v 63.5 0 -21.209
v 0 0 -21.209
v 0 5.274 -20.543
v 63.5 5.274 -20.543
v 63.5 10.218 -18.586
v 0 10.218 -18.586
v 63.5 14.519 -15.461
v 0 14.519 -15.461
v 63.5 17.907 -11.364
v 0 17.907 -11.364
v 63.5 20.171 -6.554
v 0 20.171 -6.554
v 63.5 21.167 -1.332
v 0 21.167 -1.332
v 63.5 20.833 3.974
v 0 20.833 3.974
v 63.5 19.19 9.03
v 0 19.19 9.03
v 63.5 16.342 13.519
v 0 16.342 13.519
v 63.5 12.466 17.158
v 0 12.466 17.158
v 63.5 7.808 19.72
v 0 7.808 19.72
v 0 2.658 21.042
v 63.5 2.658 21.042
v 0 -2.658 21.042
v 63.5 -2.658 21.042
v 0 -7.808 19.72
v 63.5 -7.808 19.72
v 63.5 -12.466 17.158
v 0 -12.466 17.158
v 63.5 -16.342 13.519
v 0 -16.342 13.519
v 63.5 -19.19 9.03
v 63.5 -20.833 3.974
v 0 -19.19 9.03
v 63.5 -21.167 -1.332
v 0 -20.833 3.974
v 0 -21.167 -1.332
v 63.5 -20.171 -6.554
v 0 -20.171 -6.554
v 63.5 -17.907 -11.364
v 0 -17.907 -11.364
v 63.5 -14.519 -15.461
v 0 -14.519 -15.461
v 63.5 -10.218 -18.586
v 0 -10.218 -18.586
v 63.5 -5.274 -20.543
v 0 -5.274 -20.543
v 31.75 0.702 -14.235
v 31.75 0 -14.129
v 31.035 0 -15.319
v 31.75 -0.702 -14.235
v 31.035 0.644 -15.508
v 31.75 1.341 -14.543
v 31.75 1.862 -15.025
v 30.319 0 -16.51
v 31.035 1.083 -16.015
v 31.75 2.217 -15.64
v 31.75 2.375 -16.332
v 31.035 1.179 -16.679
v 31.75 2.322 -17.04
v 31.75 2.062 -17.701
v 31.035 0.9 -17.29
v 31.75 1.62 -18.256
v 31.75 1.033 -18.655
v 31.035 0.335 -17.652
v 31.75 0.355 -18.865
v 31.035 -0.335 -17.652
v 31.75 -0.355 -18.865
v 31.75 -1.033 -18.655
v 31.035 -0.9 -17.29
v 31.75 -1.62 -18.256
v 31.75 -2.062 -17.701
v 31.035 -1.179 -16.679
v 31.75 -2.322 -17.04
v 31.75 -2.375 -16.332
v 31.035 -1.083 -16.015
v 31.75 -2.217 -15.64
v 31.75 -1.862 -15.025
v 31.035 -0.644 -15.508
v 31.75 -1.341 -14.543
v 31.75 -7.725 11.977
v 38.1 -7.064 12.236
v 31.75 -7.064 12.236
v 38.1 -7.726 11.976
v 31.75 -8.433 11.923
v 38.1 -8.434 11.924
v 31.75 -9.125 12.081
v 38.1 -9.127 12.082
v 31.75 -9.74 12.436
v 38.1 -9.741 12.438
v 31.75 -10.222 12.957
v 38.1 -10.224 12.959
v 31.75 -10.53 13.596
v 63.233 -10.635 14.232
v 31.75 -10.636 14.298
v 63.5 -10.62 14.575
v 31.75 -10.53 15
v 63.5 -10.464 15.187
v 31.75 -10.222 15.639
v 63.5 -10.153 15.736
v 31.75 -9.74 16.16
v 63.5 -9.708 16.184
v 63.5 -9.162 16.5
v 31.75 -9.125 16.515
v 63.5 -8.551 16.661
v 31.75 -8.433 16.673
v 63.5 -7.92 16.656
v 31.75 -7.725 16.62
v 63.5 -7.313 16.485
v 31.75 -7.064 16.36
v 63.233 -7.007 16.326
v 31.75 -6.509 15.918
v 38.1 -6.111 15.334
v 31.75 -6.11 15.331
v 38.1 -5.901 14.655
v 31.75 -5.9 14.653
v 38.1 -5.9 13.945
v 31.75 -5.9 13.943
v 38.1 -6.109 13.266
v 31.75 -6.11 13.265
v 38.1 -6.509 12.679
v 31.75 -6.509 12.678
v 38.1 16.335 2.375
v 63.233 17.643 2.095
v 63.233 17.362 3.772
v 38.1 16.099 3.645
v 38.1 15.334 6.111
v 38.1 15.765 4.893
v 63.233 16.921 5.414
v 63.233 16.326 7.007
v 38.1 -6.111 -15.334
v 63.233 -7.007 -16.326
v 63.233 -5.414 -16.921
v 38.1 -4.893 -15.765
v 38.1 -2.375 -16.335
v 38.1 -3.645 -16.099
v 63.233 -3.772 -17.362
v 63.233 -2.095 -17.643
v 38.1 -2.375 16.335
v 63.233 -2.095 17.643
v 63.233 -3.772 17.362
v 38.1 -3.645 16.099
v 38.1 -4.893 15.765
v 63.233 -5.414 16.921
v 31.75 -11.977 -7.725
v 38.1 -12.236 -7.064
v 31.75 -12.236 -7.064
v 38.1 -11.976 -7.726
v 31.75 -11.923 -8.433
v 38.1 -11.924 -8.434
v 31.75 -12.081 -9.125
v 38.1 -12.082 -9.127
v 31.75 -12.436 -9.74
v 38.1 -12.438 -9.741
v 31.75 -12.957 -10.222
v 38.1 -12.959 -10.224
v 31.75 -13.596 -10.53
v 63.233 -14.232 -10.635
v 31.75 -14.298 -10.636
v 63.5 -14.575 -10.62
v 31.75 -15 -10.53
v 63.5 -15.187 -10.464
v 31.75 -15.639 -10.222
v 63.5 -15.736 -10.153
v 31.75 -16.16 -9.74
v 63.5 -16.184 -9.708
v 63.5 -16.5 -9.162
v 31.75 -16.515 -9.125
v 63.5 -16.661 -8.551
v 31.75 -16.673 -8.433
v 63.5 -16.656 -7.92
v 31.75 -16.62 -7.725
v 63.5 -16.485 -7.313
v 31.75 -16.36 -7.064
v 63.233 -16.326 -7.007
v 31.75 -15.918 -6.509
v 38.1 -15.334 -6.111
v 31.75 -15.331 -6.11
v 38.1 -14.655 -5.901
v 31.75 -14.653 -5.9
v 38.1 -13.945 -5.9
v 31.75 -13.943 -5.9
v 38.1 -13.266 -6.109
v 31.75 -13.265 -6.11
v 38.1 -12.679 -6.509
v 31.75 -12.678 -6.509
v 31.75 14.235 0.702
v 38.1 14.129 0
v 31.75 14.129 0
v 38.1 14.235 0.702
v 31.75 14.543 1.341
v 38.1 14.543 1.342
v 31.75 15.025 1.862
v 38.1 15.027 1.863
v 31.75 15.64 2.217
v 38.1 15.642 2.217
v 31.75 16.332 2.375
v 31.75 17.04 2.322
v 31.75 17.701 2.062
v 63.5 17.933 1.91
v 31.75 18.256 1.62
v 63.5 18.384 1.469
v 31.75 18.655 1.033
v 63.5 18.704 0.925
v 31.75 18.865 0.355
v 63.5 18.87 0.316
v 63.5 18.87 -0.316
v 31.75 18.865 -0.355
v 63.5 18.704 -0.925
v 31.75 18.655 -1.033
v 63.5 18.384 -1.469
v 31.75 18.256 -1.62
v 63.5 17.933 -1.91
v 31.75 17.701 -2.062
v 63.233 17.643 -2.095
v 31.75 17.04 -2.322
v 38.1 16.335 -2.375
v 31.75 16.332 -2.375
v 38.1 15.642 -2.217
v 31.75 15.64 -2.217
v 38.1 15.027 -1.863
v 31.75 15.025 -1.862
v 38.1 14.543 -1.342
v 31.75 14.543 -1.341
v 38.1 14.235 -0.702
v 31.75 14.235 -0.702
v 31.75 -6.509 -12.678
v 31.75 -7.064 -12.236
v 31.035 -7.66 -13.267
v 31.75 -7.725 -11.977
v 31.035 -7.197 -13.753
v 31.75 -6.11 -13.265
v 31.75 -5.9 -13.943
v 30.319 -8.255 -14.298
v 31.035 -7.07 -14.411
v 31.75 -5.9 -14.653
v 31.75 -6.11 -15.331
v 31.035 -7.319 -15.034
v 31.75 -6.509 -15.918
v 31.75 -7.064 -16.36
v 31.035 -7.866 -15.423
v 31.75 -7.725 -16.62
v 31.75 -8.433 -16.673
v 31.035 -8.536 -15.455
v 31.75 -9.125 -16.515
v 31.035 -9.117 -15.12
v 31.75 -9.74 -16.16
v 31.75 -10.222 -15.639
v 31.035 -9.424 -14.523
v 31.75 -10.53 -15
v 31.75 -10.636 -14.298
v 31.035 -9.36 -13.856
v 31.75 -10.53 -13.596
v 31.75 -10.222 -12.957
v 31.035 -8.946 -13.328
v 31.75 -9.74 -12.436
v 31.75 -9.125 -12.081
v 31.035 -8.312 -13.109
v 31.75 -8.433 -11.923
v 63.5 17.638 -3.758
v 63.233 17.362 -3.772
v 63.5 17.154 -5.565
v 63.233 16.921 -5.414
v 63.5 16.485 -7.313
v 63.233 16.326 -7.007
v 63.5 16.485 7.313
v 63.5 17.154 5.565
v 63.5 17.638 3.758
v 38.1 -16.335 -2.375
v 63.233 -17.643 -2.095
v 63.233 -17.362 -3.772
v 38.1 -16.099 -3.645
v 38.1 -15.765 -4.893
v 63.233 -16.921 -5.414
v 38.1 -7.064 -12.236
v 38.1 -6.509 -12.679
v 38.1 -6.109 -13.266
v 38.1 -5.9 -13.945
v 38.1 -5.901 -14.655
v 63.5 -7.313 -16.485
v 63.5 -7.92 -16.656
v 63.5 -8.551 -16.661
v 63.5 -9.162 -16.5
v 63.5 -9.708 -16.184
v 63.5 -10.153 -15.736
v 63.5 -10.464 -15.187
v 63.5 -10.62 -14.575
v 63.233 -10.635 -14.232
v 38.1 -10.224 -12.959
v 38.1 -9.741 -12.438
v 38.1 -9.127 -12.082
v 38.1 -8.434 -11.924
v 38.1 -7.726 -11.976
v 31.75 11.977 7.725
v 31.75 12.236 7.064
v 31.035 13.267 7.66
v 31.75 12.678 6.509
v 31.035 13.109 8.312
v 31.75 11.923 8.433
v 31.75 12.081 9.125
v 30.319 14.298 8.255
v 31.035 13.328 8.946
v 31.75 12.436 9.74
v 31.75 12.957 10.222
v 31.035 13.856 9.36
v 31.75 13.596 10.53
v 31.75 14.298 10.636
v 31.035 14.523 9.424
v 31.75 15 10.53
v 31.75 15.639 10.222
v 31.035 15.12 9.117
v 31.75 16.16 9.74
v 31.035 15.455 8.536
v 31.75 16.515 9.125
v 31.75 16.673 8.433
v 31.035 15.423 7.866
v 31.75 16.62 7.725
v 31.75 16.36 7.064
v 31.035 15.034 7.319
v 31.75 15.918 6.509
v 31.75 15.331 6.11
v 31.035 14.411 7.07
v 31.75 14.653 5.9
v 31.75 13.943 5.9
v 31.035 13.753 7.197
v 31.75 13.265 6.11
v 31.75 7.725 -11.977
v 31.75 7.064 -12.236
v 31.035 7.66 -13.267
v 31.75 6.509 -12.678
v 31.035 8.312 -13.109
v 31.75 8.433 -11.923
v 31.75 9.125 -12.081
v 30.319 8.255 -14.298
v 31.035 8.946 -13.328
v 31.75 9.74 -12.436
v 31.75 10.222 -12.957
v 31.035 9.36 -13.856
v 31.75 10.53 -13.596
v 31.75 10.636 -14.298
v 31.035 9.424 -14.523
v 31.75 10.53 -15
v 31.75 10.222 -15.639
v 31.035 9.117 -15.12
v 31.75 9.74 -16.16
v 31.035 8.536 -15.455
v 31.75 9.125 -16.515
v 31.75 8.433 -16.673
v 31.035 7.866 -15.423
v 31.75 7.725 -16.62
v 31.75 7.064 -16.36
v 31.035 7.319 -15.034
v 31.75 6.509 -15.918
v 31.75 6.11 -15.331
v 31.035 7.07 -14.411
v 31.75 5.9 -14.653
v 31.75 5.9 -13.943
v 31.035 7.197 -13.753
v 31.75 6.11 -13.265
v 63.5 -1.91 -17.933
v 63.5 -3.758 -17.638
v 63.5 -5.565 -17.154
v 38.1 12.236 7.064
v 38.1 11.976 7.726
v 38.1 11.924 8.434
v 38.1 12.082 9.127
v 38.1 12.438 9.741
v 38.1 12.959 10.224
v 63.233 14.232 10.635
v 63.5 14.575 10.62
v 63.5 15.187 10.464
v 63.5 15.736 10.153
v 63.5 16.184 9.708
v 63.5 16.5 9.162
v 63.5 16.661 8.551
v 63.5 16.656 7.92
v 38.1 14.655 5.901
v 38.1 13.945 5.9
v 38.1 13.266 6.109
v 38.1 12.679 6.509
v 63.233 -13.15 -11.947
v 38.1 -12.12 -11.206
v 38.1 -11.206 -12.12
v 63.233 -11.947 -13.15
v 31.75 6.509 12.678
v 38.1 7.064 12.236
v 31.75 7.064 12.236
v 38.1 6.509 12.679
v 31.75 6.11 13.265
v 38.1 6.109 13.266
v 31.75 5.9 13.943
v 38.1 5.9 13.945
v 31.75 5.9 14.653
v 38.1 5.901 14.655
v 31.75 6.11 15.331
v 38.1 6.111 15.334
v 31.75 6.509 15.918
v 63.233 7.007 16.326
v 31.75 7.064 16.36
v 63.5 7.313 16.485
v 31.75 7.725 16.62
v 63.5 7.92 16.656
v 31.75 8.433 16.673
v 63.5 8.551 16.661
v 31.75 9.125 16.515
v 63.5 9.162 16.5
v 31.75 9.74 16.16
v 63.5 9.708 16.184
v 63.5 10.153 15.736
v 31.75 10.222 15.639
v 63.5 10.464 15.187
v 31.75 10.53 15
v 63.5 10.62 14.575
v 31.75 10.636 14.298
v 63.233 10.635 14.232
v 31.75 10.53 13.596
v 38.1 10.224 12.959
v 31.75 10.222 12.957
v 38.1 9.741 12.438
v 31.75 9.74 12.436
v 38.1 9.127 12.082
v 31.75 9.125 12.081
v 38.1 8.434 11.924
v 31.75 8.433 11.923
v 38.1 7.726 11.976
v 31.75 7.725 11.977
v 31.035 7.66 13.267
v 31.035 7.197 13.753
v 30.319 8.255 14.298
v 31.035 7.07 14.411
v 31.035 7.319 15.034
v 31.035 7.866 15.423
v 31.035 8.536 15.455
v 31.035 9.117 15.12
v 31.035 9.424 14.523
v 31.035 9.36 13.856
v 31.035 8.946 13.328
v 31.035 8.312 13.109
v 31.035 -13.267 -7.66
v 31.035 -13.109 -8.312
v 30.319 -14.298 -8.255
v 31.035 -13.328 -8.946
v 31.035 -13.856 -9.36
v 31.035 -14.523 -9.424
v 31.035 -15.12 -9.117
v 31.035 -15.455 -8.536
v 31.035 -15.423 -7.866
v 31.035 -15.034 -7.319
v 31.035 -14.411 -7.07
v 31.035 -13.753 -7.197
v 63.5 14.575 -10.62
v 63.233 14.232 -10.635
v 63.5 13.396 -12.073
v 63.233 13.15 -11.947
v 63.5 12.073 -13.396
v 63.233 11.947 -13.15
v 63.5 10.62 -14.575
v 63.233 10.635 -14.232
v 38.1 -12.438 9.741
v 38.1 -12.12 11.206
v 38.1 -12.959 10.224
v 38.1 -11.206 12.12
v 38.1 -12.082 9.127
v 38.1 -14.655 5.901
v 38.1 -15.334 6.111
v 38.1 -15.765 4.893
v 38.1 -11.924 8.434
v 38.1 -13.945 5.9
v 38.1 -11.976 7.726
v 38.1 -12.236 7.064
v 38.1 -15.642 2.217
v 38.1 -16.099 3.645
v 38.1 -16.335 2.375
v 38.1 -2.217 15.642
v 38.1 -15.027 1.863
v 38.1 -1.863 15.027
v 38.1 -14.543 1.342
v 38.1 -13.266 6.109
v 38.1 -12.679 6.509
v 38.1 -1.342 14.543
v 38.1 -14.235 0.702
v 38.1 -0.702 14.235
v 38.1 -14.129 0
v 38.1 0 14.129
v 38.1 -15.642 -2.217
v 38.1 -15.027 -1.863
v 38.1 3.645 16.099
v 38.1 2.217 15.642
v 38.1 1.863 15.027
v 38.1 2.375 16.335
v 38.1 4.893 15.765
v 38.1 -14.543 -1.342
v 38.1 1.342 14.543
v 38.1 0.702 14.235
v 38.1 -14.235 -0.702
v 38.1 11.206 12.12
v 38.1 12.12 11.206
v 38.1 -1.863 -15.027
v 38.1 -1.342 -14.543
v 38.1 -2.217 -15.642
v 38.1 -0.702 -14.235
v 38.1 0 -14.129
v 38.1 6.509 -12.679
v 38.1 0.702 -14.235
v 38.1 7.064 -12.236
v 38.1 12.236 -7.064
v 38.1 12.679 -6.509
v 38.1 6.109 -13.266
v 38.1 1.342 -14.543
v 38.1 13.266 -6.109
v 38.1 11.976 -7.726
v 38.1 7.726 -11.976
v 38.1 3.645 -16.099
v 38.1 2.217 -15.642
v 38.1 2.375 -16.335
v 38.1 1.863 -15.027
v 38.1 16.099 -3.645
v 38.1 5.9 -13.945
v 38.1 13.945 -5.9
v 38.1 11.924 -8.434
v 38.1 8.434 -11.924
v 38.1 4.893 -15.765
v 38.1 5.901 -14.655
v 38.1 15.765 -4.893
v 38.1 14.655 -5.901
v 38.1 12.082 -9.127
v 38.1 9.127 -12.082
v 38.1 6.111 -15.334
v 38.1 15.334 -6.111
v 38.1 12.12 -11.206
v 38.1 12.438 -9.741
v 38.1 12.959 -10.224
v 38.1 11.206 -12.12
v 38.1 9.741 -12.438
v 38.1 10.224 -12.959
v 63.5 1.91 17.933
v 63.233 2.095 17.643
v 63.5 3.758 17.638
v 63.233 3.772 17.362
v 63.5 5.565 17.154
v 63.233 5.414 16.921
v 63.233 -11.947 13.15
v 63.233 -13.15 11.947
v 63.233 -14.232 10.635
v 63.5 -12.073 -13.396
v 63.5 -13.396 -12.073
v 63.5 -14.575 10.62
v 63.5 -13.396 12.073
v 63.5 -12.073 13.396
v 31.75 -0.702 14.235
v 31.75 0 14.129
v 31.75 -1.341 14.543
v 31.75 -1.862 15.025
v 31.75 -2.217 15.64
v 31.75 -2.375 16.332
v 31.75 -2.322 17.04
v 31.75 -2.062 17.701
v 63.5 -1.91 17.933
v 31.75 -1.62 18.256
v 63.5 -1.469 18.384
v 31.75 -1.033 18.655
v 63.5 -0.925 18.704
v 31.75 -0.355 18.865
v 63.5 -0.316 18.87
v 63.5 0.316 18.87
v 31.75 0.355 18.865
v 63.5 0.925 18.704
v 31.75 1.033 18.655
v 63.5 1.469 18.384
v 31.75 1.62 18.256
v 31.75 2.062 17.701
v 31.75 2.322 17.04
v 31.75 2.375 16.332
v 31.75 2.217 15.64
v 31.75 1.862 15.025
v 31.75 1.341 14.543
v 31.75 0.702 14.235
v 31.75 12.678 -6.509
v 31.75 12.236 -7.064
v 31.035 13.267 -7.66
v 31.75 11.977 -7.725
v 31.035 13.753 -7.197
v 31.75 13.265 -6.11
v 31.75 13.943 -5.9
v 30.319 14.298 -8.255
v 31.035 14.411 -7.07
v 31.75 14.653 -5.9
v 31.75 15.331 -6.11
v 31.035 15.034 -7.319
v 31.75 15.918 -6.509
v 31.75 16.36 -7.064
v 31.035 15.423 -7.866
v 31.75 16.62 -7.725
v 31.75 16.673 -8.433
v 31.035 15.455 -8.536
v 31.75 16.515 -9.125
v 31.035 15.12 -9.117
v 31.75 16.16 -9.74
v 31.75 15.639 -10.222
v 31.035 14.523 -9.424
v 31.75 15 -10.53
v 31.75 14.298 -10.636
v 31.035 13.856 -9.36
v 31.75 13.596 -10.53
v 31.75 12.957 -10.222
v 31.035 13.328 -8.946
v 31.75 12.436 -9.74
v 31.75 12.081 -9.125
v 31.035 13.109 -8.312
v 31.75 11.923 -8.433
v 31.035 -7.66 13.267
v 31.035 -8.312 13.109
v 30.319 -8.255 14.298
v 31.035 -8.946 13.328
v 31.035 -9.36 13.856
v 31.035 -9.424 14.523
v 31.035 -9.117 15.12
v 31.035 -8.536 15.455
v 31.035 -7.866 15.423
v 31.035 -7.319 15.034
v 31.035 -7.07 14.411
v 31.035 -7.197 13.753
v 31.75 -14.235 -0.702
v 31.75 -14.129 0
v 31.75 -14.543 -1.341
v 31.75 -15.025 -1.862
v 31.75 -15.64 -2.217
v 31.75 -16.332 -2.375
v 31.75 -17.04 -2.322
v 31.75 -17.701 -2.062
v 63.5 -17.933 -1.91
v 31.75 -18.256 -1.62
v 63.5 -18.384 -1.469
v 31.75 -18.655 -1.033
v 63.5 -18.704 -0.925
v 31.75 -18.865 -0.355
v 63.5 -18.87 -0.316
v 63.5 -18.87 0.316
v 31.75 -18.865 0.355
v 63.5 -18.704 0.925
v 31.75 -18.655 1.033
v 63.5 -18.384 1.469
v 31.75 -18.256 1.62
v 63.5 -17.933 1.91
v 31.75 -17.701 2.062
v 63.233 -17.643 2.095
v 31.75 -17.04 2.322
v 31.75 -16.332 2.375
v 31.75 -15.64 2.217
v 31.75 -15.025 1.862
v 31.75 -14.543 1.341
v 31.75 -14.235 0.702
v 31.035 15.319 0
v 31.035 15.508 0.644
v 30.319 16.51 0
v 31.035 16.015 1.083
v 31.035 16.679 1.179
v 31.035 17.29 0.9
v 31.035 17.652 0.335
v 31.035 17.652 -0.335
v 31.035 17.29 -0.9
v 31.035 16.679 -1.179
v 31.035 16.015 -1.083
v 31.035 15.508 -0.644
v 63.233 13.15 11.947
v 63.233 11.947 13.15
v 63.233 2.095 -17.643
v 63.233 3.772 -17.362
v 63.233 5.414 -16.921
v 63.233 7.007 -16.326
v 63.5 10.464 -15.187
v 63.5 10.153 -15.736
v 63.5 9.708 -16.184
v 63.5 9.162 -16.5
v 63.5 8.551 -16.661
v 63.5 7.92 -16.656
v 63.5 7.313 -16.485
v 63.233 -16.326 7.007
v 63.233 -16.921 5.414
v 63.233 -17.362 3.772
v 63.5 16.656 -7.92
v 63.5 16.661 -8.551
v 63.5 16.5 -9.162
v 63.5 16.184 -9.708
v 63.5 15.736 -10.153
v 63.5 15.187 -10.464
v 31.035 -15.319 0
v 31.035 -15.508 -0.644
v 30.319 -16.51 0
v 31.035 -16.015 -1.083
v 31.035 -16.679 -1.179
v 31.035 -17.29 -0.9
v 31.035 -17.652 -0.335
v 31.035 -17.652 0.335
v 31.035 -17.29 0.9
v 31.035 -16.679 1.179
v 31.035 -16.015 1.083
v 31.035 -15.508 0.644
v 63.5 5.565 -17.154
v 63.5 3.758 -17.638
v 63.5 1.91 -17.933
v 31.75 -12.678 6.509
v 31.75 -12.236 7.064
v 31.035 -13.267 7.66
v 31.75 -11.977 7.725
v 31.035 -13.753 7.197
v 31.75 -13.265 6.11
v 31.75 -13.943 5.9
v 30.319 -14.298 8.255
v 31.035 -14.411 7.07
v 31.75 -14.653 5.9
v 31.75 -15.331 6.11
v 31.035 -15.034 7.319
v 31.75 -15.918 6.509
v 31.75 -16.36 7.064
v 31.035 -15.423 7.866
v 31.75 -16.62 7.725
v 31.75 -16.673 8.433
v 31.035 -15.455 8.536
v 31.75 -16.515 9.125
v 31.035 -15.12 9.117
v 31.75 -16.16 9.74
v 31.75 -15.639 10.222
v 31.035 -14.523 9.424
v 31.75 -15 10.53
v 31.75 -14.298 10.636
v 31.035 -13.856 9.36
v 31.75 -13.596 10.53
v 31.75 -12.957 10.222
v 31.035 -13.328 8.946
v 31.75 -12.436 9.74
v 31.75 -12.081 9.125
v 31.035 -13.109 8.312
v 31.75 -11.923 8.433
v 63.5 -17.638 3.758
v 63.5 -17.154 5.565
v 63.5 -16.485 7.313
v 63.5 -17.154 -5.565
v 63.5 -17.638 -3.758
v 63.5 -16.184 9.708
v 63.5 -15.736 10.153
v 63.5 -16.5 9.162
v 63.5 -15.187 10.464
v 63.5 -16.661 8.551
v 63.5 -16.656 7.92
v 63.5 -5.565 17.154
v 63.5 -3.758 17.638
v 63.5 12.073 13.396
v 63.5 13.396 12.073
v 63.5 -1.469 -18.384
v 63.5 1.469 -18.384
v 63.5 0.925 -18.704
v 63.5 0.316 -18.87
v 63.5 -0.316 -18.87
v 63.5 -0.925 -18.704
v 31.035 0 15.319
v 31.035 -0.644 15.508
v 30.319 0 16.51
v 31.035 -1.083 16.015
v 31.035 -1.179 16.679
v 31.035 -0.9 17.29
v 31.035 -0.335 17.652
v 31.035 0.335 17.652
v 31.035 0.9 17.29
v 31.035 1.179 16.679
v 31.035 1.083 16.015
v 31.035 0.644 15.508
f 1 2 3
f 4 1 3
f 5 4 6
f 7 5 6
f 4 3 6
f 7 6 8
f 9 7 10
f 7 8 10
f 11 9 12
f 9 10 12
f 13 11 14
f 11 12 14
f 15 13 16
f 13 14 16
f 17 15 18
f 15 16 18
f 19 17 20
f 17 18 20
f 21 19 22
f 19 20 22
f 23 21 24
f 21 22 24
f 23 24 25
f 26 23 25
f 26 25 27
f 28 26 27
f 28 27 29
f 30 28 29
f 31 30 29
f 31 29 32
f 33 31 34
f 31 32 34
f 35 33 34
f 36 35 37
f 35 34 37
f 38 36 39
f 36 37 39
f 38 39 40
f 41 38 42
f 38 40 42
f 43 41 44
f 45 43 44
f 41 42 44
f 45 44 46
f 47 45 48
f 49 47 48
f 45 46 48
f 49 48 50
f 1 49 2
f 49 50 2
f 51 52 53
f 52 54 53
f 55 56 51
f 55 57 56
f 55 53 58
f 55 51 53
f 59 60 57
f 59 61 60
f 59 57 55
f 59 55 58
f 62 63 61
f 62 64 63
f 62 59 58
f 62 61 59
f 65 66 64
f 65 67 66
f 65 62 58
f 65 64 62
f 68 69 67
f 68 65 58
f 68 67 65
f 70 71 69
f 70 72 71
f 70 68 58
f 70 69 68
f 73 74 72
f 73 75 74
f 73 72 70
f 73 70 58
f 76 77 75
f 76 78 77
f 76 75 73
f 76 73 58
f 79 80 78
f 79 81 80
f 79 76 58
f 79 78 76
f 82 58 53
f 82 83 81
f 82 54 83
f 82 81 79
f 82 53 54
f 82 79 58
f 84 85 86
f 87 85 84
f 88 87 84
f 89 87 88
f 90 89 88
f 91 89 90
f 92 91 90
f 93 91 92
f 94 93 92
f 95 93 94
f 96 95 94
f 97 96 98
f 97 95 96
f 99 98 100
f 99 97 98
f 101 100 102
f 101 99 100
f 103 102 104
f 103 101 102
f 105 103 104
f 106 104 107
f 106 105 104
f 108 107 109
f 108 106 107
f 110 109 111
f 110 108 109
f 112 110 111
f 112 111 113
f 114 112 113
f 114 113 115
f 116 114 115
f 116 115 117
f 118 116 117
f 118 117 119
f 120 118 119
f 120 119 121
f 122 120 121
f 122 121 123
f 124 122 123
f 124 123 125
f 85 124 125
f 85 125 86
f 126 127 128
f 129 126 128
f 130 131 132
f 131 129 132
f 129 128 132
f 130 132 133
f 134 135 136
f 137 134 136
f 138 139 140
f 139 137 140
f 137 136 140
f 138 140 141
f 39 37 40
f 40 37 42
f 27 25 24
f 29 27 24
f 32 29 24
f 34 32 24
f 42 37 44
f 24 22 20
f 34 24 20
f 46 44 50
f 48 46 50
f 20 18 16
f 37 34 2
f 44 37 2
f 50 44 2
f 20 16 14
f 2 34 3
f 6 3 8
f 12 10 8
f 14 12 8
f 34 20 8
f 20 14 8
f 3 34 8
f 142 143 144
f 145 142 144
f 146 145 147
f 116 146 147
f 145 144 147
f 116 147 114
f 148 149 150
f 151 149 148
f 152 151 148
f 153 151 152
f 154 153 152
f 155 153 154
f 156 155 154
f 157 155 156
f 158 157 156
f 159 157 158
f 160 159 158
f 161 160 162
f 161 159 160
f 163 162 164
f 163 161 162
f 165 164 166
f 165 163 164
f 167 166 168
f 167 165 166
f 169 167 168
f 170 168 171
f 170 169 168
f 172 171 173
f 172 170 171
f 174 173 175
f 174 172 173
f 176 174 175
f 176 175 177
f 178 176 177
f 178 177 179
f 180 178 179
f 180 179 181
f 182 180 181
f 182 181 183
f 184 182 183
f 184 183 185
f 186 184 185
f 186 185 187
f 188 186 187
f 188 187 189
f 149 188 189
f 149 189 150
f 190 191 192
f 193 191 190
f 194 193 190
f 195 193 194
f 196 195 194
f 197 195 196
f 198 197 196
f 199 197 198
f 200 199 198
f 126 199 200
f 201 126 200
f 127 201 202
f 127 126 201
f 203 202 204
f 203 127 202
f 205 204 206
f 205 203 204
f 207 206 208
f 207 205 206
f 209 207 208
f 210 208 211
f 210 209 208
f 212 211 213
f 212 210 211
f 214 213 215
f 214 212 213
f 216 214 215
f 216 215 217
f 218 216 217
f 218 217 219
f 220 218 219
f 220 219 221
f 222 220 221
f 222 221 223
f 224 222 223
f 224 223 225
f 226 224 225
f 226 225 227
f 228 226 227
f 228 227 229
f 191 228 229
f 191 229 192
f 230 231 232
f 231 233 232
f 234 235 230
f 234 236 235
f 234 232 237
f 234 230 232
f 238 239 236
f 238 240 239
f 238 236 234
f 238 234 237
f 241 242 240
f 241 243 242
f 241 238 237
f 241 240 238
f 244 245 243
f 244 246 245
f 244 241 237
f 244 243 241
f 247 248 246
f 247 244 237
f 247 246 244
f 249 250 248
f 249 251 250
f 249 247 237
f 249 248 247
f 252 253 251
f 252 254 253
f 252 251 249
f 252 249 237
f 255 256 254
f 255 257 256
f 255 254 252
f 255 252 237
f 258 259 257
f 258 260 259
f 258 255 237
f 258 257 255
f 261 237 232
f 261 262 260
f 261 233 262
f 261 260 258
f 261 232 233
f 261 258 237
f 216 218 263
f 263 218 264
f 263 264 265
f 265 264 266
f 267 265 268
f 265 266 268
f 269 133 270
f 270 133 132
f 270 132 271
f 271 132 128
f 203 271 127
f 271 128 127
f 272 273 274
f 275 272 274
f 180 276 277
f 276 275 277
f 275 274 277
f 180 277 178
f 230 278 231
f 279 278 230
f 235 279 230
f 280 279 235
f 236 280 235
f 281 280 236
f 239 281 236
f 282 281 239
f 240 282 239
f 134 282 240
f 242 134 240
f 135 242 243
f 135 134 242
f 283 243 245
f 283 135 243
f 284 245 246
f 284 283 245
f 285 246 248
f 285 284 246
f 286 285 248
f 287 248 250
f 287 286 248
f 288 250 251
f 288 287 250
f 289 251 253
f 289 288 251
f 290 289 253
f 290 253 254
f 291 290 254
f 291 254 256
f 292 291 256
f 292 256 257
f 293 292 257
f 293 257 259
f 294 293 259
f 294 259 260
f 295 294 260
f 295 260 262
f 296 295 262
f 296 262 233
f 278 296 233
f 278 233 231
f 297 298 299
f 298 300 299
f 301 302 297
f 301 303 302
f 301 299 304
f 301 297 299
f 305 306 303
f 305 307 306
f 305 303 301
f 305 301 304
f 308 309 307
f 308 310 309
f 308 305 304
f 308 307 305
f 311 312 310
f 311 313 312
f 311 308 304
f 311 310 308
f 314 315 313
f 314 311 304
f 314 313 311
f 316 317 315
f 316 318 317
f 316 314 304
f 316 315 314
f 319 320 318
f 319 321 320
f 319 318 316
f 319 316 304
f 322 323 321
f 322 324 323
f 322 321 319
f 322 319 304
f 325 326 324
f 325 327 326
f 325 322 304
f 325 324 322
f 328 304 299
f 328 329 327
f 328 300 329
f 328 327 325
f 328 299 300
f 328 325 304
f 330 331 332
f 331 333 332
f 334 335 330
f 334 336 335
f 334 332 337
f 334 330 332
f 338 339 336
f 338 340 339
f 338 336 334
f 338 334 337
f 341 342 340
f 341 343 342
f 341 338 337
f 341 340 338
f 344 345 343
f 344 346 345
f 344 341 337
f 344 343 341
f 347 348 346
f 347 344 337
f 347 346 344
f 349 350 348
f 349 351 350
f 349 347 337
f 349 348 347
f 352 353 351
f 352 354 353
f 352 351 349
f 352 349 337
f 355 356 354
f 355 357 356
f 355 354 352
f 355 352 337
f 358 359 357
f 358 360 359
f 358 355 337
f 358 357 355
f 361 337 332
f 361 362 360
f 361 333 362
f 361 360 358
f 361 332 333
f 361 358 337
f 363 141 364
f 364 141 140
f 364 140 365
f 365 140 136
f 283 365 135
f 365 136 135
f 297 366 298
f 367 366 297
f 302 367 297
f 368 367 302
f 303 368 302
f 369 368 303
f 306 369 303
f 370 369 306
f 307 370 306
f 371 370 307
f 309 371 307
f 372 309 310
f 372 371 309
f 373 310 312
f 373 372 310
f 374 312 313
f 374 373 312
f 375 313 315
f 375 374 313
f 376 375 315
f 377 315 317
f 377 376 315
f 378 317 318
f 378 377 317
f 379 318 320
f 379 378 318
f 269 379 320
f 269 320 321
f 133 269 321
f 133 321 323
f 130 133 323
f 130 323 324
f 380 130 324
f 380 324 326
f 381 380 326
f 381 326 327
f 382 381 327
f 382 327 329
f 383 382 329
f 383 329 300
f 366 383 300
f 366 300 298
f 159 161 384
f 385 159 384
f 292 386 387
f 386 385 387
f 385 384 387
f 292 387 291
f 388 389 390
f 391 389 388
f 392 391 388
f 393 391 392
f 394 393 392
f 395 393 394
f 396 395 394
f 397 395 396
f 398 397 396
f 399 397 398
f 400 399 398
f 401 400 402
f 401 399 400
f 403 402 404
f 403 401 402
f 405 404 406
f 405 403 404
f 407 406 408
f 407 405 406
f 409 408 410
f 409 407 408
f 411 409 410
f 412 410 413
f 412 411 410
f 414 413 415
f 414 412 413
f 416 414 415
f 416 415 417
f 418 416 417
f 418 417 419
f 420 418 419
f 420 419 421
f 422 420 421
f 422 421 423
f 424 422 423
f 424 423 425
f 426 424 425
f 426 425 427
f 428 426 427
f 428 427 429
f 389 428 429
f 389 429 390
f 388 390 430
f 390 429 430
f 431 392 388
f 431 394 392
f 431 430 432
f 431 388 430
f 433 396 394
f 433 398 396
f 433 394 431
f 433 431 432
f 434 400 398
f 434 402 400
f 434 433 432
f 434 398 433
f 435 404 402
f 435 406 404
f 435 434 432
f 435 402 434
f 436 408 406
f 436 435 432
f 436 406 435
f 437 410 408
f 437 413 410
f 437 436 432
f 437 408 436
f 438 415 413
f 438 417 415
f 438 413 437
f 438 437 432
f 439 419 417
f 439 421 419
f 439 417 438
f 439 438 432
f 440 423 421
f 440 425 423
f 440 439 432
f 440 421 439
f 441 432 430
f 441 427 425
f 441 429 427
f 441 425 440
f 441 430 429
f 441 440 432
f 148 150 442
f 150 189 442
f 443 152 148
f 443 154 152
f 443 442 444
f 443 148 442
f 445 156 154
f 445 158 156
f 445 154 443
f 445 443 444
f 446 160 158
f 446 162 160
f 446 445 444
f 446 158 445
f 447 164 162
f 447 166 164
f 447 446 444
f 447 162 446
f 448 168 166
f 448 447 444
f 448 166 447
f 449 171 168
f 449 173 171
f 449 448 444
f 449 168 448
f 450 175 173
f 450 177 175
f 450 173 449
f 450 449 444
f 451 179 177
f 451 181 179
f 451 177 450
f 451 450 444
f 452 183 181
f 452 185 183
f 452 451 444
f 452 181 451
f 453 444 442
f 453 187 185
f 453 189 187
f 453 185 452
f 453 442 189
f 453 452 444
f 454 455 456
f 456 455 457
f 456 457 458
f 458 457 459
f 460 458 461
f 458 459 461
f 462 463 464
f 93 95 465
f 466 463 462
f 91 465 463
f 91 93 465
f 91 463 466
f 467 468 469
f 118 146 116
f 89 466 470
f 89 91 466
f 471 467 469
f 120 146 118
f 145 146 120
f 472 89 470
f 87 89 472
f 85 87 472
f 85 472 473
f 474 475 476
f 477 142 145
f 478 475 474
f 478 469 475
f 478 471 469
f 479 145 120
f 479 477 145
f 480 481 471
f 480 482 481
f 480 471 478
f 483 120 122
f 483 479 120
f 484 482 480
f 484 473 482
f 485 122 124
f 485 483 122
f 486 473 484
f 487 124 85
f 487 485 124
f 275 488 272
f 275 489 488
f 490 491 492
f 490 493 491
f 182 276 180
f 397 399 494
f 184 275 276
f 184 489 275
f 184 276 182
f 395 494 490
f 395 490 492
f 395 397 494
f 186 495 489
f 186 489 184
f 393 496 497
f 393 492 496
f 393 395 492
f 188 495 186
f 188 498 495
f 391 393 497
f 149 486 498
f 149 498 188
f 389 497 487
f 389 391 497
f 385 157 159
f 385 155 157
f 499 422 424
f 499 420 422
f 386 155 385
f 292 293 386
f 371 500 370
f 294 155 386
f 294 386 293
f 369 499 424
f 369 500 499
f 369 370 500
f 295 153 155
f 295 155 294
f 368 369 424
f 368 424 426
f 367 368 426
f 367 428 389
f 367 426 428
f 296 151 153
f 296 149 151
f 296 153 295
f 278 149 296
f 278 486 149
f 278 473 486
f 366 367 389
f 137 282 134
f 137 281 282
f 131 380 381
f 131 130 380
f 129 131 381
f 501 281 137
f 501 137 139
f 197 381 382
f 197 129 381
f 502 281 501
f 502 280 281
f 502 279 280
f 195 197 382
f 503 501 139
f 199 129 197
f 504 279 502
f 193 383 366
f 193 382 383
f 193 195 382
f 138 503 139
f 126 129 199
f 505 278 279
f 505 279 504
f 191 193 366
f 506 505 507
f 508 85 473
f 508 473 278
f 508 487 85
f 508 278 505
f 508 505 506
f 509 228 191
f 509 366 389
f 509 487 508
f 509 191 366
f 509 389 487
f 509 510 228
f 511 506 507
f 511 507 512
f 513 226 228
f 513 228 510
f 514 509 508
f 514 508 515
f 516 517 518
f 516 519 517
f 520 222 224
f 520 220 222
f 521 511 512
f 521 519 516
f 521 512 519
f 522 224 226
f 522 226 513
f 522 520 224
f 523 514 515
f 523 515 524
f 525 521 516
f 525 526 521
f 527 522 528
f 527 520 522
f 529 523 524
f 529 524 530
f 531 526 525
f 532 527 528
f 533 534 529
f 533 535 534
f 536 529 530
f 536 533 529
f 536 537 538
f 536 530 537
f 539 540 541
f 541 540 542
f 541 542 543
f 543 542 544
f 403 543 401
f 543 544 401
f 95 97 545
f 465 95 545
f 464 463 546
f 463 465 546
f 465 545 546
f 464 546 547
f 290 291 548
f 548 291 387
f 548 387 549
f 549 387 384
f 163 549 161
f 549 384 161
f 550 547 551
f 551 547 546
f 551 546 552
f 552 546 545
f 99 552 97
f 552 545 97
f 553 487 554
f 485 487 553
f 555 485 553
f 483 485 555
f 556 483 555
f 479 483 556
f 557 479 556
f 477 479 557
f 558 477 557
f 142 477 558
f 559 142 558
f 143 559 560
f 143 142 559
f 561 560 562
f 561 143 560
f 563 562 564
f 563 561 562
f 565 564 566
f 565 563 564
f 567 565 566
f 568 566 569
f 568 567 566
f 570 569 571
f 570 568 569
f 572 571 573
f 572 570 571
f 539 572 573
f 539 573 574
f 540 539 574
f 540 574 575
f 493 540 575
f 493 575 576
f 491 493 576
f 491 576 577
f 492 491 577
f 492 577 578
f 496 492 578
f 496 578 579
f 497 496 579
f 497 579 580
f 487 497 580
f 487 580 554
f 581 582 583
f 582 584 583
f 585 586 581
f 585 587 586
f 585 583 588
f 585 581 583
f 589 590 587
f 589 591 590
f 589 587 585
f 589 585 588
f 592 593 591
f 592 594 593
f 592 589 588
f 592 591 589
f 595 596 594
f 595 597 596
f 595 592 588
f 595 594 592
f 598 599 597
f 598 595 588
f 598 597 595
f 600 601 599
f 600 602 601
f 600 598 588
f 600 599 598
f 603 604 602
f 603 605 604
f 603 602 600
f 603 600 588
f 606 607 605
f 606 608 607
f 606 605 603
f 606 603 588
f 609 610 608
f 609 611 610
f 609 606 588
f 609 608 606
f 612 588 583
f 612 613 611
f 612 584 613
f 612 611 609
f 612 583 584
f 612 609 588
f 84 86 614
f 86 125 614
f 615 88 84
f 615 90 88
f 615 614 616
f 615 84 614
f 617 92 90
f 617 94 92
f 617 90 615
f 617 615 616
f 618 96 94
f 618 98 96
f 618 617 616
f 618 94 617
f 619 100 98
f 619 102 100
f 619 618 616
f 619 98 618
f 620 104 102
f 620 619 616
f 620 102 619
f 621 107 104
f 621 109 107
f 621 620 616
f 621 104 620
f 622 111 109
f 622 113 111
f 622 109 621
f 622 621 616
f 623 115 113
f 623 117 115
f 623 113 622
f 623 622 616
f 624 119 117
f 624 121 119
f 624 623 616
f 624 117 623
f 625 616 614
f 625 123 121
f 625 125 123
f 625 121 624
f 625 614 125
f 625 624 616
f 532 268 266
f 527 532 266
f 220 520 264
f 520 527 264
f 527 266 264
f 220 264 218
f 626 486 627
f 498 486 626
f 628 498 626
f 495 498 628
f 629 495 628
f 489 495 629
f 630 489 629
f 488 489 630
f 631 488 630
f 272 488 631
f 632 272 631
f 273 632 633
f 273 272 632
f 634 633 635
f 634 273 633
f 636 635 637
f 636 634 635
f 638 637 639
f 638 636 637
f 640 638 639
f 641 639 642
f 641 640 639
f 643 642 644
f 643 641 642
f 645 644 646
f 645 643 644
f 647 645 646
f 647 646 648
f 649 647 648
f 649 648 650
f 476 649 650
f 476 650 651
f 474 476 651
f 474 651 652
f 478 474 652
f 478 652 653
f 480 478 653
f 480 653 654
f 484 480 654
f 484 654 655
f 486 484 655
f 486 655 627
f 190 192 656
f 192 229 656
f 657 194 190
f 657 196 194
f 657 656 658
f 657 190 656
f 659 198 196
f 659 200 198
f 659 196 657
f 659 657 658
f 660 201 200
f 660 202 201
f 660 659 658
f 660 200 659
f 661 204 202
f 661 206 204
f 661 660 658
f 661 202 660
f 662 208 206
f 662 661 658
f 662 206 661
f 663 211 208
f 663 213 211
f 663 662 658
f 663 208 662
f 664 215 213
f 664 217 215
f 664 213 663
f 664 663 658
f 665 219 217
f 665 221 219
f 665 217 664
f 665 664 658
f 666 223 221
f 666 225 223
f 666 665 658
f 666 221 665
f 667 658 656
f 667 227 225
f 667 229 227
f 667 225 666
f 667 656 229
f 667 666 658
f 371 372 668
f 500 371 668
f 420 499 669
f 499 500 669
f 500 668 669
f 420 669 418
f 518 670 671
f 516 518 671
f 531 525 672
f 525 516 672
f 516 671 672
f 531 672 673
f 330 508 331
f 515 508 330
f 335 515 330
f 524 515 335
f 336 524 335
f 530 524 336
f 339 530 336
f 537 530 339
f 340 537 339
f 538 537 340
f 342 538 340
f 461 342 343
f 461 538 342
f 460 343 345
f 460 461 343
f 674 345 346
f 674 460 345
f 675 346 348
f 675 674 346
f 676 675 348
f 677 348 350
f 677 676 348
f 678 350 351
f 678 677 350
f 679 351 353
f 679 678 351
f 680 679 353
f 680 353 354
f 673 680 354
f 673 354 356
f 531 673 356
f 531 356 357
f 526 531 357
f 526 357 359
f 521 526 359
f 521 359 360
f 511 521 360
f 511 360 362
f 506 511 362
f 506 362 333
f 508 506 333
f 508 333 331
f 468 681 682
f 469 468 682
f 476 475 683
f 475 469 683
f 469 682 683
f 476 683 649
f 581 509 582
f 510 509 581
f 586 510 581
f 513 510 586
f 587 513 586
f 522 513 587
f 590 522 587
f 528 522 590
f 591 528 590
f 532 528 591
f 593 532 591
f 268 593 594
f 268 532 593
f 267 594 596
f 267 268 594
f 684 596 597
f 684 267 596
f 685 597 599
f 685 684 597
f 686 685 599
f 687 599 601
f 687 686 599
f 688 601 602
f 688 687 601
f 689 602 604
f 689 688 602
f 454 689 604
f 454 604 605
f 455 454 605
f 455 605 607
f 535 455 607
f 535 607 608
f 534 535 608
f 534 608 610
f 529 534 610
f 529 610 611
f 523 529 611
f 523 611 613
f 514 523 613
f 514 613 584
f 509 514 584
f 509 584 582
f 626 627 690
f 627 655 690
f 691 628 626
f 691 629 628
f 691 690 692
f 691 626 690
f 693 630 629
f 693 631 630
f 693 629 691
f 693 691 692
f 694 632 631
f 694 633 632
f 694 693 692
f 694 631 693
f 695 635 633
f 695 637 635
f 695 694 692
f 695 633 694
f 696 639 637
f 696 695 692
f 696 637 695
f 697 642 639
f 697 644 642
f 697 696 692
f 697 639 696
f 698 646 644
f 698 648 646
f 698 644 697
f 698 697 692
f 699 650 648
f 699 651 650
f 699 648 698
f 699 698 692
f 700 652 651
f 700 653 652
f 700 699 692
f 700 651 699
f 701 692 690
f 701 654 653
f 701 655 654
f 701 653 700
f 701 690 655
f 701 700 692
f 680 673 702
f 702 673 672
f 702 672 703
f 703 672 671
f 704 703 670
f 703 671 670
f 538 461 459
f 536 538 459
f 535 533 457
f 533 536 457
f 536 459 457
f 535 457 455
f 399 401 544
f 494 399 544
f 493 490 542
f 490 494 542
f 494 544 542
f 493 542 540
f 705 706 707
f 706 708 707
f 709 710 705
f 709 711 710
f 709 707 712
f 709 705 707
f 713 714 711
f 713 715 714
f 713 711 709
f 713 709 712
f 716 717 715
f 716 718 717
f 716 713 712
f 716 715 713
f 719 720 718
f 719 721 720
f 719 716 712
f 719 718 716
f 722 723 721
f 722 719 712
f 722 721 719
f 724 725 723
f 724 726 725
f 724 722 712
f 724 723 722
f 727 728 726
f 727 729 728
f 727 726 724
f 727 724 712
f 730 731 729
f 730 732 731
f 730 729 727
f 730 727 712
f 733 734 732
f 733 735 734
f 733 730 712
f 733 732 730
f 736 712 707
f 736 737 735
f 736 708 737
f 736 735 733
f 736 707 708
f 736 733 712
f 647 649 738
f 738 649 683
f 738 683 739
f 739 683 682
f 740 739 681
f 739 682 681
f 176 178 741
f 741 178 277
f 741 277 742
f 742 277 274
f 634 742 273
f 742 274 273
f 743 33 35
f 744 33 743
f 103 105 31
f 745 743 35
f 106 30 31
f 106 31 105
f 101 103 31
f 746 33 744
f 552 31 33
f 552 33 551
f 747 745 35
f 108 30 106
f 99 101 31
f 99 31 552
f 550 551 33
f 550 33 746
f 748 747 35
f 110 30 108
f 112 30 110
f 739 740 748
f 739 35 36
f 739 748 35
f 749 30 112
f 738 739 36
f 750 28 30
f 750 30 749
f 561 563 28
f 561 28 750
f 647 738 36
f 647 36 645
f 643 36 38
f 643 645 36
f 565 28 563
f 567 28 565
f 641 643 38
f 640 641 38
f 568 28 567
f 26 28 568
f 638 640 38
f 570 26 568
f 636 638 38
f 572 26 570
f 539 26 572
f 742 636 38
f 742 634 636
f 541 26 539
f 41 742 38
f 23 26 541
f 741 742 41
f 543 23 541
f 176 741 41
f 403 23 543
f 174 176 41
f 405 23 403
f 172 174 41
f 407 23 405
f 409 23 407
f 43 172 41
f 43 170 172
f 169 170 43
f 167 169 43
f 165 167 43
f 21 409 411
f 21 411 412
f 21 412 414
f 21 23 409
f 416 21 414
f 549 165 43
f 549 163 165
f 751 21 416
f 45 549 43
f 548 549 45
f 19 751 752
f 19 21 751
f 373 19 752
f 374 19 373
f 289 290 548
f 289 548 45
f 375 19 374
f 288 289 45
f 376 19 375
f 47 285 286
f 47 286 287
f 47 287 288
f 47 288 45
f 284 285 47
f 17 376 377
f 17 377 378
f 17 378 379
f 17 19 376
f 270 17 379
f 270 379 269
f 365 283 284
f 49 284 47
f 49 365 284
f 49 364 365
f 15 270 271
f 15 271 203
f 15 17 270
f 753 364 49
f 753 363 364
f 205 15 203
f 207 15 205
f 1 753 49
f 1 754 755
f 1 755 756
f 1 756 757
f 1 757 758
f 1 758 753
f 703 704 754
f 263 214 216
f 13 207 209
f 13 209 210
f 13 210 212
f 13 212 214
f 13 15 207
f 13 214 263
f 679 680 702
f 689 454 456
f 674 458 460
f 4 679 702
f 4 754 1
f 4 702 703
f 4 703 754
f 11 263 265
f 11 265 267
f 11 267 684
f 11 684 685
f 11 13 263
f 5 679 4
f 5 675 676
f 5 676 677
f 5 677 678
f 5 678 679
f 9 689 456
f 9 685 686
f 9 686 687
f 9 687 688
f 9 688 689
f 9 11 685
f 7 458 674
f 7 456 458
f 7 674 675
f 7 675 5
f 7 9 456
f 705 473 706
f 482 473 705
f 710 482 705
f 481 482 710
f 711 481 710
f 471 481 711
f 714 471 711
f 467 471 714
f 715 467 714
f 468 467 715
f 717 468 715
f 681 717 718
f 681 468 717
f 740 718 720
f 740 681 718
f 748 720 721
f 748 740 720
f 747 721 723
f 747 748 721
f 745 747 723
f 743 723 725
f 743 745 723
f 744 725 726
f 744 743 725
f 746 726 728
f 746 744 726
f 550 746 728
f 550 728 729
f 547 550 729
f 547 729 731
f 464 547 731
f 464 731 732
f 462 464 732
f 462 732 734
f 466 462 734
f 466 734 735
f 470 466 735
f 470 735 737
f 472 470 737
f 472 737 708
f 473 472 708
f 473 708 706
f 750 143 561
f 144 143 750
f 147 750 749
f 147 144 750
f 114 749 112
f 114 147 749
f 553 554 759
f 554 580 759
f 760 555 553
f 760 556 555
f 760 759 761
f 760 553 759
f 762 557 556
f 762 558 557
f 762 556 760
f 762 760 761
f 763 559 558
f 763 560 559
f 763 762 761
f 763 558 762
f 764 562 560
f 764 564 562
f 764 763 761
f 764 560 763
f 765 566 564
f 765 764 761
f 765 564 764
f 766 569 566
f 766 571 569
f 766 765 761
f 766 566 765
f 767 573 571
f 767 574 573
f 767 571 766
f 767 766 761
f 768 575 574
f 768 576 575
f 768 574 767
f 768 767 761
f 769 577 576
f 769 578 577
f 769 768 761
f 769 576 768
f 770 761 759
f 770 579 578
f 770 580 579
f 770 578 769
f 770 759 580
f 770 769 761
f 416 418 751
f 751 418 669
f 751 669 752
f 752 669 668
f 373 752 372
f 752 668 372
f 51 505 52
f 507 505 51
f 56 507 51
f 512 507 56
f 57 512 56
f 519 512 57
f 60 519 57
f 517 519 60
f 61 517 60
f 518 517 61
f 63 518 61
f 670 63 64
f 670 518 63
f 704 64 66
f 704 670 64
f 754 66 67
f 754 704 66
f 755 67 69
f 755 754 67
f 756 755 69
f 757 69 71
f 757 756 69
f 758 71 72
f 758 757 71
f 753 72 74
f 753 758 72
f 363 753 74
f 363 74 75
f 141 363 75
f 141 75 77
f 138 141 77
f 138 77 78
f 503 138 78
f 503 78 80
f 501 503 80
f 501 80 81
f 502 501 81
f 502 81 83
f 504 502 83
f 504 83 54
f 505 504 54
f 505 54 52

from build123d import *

# Parameters (mm, degrees)
SKETCH1_R              = 21.209
EXTRUDE1_DEPTH         = 63.5
SKETCH2_R              = 17.78
EXTRUDE2_DEPTH         = 25.4
EXTRUDE2_DRAFT         = -2.87
CIRPATTERN1_COUNT      = 12
CHAMFER2_SIZE          = 0.254
CHAMFER2_SIZE2         = 0.267741651
CHAMFER2_EDGE_2_SIZE   = 0.254
CHAMFER2_EDGE_2_SIZE2  = 0.267741651
CHAMFER2_EDGE_3_SIZE   = 0.254
CHAMFER2_EDGE_3_SIZE2  = 0.267741651
CHAMFER2_EDGE_4_SIZE   = 0.254
CHAMFER2_EDGE_4_SIZE2  = 0.267741651
CHAMFER2_EDGE_5_SIZE   = 0.254
CHAMFER2_EDGE_5_SIZE2  = 0.267741651
CHAMFER2_EDGE_6_SIZE   = 0.254
CHAMFER2_EDGE_6_SIZE2  = 0.267741651
CHAMFER2_EDGE_7_SIZE   = 0.254
CHAMFER2_EDGE_7_SIZE2  = 0.267741651
CHAMFER2_EDGE_8_SIZE   = 0.254
CHAMFER2_EDGE_8_SIZE2  = 0.267741651
CHAMFER2_EDGE_9_SIZE   = 0.254
CHAMFER2_EDGE_9_SIZE2  = 0.267741651
CHAMFER2_EDGE_10_SIZE  = 0.254
CHAMFER2_EDGE_10_SIZE2 = 0.267741651
CHAMFER2_EDGE_11_SIZE  = 0.254
CHAMFER2_EDGE_11_SIZE2 = 0.267741651
CHAMFER2_EDGE_12_SIZE  = 0.254
CHAMFER2_EDGE_12_SIZE2 = 0.267741651


with BuildPart() as part:
    # Sketch1 → Extrude1 (new body)
    with BuildSketch(Plane(origin=(0, 0, 0), x_dir=(0, 0, -1), z_dir=(1, 0, 0))):
        Circle(SKETCH1_R)
    extrude(amount=EXTRUDE1_DEPTH)


with BuildPart() as extrude2_tool:
    # Sketch2 → Extrude2 (with draft: the straight prism first)
    with BuildSketch(Plane(origin=(63.5, 0, 0), x_dir=(0, 0, -1), z_dir=(1, 0, 0))):
        Circle(SKETCH2_R)
    extrude(amount=-EXTRUDE2_DEPTH)
    # Extrude2: the draft: its side faces are tilted about the plane it starts from
    extrude2_sides = [extrude2_tool.faces().sort_by_distance(p)[0] for p in [
        (50.8, 0, 17.78),
    ]]
    draft(extrude2_sides, Plane(origin=(63.5, 0, 0), x_dir=(0, 0, -1), z_dir=(1, 0, 0)), EXTRUDE2_DRAFT)


with BuildPart() as part_1:
    add(part.part)

    # Extrude2: cut by extrude2_tool
    add(extrude2_tool.part, mode=Mode.SUBTRACT)

    # Sketch4 → 3/16 (0.1875) Diameter Hole1 (revolve, cut)
    with BuildSketch(Plane(origin=(63.5, 0, 16.51), x_dir=(0, 0, -1), z_dir=(0, 1, 0))):
        Polygon((0, 0), (0, 33.180799349), (2.38125, 31.75), (2.38125, 0), align=None)
    f_3_16_0_1875_diameter_hole1 = revolve(axis=Axis((69.85, 0, 16.51), (-1, 0, 0)), mode=Mode.SUBTRACT)

    # CirPattern1: 3/16 (0.1875) Diameter Hole1 ×12 about axis
    cirpattern1_axis = Axis((0, 0, 0), (1, 0, 0))
    for i in range(1, CIRPATTERN1_COUNT):
        add(f_3_16_0_1875_diameter_hole1.rotate(cirpattern1_axis, i * 360 / CIRPATTERN1_COUNT), mode=Mode.SUBTRACT)

    # Chamfer2
    chamfer2_edges = [part_1.edges().sort_by_distance(p)[0] for p in [
        (63.5, 17.174161191, -4.601802622),
    ]]
    chamfer2_side = [part_1.faces().sort_by_distance(p)[0] for p in [
        (63.5, 0, 20.609118891),
    ]]
    chamfer(chamfer2_edges, length=CHAMFER2_SIZE, length2=CHAMFER2_SIZE2, reference=chamfer2_side[0])

    # Chamfer2 edge 2
    chamfer2_edge_2_edges = [part_1.edges().sort_by_distance(p)[0] for p in [
        (63.5, 12.572358569, -12.572358569),
    ]]
    chamfer2_edge_2_side = [part_1.faces().sort_by_distance(p)[0] for p in [
        (63.5, 0, 20.609118891),
    ]]
    chamfer(chamfer2_edge_2_edges, length=CHAMFER2_EDGE_2_SIZE, length2=CHAMFER2_EDGE_2_SIZE2, reference=chamfer2_edge_2_side[0])

    # Chamfer2 edge 3
    chamfer2_edge_3_edges = [part_1.edges().sort_by_distance(p)[0] for p in [
        (63.5, 4.601802622, -17.174161191),
    ]]
    chamfer2_edge_3_side = [part_1.faces().sort_by_distance(p)[0] for p in [
        (63.5, 0, 20.609118891),
    ]]
    chamfer(chamfer2_edge_3_edges, length=CHAMFER2_EDGE_3_SIZE, length2=CHAMFER2_EDGE_3_SIZE2, reference=chamfer2_edge_3_side[0])

    # Chamfer2 edge 4
    chamfer2_edge_4_edges = [part_1.edges().sort_by_distance(p)[0] for p in [
        (63.5, -4.601802622, -17.174161191),
    ]]
    chamfer2_edge_4_side = [part_1.faces().sort_by_distance(p)[0] for p in [
        (63.5, 0, 20.609118891),
    ]]
    chamfer(chamfer2_edge_4_edges, length=CHAMFER2_EDGE_4_SIZE, length2=CHAMFER2_EDGE_4_SIZE2, reference=chamfer2_edge_4_side[0])

    # Chamfer2 edge 5
    chamfer2_edge_5_edges = [part_1.edges().sort_by_distance(p)[0] for p in [
        (63.5, -12.572358569, -12.572358569),
    ]]
    chamfer2_edge_5_side = [part_1.faces().sort_by_distance(p)[0] for p in [
        (63.5, 0, 20.609118891),
    ]]
    chamfer(chamfer2_edge_5_edges, length=CHAMFER2_EDGE_5_SIZE, length2=CHAMFER2_EDGE_5_SIZE2, reference=chamfer2_edge_5_side[0])

    # Chamfer2 edge 6
    chamfer2_edge_6_edges = [part_1.edges().sort_by_distance(p)[0] for p in [
        (63.5, -17.174161191, -4.601802622),
    ]]
    chamfer2_edge_6_side = [part_1.faces().sort_by_distance(p)[0] for p in [
        (63.5, 0, 20.609118891),
    ]]
    chamfer(chamfer2_edge_6_edges, length=CHAMFER2_EDGE_6_SIZE, length2=CHAMFER2_EDGE_6_SIZE2, reference=chamfer2_edge_6_side[0])

    # Chamfer2 edge 7
    chamfer2_edge_7_edges = [part_1.edges().sort_by_distance(p)[0] for p in [
        (63.5, -17.174161191, 4.601802622),
    ]]
    chamfer2_edge_7_side = [part_1.faces().sort_by_distance(p)[0] for p in [
        (63.5, 0, 20.609118891),
    ]]
    chamfer(chamfer2_edge_7_edges, length=CHAMFER2_EDGE_7_SIZE, length2=CHAMFER2_EDGE_7_SIZE2, reference=chamfer2_edge_7_side[0])

    # Chamfer2 edge 8
    chamfer2_edge_8_edges = [part_1.edges().sort_by_distance(p)[0] for p in [
        (63.5, -12.572358569, 12.572358569),
    ]]
    chamfer2_edge_8_side = [part_1.faces().sort_by_distance(p)[0] for p in [
        (63.5, 0, 20.609118891),
    ]]
    chamfer(chamfer2_edge_8_edges, length=CHAMFER2_EDGE_8_SIZE, length2=CHAMFER2_EDGE_8_SIZE2, reference=chamfer2_edge_8_side[0])

    # Chamfer2 edge 9
    chamfer2_edge_9_edges = [part_1.edges().sort_by_distance(p)[0] for p in [
        (63.5, -4.601802622, 17.174161191),
    ]]
    chamfer2_edge_9_side = [part_1.faces().sort_by_distance(p)[0] for p in [
        (63.5, 0, 20.609118891),
    ]]
    chamfer(chamfer2_edge_9_edges, length=CHAMFER2_EDGE_9_SIZE, length2=CHAMFER2_EDGE_9_SIZE2, reference=chamfer2_edge_9_side[0])

    # Chamfer2 edge 10
    chamfer2_edge_10_edges = [part_1.edges().sort_by_distance(p)[0] for p in [
        (63.5, 4.601802622, 17.174161191),
    ]]
    chamfer2_edge_10_side = [part_1.faces().sort_by_distance(p)[0] for p in [
        (63.5, 0, 20.609118891),
    ]]
    chamfer(chamfer2_edge_10_edges, length=CHAMFER2_EDGE_10_SIZE, length2=CHAMFER2_EDGE_10_SIZE2, reference=chamfer2_edge_10_side[0])

    # Chamfer2 edge 11
    chamfer2_edge_11_edges = [part_1.edges().sort_by_distance(p)[0] for p in [
        (63.5, 12.572358569, 12.572358569),
    ]]
    chamfer2_edge_11_side = [part_1.faces().sort_by_distance(p)[0] for p in [
        (63.5, 0, 20.609118891),
    ]]
    chamfer(chamfer2_edge_11_edges, length=CHAMFER2_EDGE_11_SIZE, length2=CHAMFER2_EDGE_11_SIZE2, reference=chamfer2_edge_11_side[0])

    # Chamfer2 edge 12
    chamfer2_edge_12_edges = [part_1.edges().sort_by_distance(p)[0] for p in [
        (63.5, 17.174161191, 4.601802622),
    ]]
    chamfer2_edge_12_side = [part_1.faces().sort_by_distance(p)[0] for p in [
        (63.5, 0, 20.609118891),
    ]]
    chamfer(chamfer2_edge_12_edges, length=CHAMFER2_EDGE_12_SIZE, length2=CHAMFER2_EDGE_12_SIZE2, reference=chamfer2_edge_12_side[0])


solid = part_1.part
